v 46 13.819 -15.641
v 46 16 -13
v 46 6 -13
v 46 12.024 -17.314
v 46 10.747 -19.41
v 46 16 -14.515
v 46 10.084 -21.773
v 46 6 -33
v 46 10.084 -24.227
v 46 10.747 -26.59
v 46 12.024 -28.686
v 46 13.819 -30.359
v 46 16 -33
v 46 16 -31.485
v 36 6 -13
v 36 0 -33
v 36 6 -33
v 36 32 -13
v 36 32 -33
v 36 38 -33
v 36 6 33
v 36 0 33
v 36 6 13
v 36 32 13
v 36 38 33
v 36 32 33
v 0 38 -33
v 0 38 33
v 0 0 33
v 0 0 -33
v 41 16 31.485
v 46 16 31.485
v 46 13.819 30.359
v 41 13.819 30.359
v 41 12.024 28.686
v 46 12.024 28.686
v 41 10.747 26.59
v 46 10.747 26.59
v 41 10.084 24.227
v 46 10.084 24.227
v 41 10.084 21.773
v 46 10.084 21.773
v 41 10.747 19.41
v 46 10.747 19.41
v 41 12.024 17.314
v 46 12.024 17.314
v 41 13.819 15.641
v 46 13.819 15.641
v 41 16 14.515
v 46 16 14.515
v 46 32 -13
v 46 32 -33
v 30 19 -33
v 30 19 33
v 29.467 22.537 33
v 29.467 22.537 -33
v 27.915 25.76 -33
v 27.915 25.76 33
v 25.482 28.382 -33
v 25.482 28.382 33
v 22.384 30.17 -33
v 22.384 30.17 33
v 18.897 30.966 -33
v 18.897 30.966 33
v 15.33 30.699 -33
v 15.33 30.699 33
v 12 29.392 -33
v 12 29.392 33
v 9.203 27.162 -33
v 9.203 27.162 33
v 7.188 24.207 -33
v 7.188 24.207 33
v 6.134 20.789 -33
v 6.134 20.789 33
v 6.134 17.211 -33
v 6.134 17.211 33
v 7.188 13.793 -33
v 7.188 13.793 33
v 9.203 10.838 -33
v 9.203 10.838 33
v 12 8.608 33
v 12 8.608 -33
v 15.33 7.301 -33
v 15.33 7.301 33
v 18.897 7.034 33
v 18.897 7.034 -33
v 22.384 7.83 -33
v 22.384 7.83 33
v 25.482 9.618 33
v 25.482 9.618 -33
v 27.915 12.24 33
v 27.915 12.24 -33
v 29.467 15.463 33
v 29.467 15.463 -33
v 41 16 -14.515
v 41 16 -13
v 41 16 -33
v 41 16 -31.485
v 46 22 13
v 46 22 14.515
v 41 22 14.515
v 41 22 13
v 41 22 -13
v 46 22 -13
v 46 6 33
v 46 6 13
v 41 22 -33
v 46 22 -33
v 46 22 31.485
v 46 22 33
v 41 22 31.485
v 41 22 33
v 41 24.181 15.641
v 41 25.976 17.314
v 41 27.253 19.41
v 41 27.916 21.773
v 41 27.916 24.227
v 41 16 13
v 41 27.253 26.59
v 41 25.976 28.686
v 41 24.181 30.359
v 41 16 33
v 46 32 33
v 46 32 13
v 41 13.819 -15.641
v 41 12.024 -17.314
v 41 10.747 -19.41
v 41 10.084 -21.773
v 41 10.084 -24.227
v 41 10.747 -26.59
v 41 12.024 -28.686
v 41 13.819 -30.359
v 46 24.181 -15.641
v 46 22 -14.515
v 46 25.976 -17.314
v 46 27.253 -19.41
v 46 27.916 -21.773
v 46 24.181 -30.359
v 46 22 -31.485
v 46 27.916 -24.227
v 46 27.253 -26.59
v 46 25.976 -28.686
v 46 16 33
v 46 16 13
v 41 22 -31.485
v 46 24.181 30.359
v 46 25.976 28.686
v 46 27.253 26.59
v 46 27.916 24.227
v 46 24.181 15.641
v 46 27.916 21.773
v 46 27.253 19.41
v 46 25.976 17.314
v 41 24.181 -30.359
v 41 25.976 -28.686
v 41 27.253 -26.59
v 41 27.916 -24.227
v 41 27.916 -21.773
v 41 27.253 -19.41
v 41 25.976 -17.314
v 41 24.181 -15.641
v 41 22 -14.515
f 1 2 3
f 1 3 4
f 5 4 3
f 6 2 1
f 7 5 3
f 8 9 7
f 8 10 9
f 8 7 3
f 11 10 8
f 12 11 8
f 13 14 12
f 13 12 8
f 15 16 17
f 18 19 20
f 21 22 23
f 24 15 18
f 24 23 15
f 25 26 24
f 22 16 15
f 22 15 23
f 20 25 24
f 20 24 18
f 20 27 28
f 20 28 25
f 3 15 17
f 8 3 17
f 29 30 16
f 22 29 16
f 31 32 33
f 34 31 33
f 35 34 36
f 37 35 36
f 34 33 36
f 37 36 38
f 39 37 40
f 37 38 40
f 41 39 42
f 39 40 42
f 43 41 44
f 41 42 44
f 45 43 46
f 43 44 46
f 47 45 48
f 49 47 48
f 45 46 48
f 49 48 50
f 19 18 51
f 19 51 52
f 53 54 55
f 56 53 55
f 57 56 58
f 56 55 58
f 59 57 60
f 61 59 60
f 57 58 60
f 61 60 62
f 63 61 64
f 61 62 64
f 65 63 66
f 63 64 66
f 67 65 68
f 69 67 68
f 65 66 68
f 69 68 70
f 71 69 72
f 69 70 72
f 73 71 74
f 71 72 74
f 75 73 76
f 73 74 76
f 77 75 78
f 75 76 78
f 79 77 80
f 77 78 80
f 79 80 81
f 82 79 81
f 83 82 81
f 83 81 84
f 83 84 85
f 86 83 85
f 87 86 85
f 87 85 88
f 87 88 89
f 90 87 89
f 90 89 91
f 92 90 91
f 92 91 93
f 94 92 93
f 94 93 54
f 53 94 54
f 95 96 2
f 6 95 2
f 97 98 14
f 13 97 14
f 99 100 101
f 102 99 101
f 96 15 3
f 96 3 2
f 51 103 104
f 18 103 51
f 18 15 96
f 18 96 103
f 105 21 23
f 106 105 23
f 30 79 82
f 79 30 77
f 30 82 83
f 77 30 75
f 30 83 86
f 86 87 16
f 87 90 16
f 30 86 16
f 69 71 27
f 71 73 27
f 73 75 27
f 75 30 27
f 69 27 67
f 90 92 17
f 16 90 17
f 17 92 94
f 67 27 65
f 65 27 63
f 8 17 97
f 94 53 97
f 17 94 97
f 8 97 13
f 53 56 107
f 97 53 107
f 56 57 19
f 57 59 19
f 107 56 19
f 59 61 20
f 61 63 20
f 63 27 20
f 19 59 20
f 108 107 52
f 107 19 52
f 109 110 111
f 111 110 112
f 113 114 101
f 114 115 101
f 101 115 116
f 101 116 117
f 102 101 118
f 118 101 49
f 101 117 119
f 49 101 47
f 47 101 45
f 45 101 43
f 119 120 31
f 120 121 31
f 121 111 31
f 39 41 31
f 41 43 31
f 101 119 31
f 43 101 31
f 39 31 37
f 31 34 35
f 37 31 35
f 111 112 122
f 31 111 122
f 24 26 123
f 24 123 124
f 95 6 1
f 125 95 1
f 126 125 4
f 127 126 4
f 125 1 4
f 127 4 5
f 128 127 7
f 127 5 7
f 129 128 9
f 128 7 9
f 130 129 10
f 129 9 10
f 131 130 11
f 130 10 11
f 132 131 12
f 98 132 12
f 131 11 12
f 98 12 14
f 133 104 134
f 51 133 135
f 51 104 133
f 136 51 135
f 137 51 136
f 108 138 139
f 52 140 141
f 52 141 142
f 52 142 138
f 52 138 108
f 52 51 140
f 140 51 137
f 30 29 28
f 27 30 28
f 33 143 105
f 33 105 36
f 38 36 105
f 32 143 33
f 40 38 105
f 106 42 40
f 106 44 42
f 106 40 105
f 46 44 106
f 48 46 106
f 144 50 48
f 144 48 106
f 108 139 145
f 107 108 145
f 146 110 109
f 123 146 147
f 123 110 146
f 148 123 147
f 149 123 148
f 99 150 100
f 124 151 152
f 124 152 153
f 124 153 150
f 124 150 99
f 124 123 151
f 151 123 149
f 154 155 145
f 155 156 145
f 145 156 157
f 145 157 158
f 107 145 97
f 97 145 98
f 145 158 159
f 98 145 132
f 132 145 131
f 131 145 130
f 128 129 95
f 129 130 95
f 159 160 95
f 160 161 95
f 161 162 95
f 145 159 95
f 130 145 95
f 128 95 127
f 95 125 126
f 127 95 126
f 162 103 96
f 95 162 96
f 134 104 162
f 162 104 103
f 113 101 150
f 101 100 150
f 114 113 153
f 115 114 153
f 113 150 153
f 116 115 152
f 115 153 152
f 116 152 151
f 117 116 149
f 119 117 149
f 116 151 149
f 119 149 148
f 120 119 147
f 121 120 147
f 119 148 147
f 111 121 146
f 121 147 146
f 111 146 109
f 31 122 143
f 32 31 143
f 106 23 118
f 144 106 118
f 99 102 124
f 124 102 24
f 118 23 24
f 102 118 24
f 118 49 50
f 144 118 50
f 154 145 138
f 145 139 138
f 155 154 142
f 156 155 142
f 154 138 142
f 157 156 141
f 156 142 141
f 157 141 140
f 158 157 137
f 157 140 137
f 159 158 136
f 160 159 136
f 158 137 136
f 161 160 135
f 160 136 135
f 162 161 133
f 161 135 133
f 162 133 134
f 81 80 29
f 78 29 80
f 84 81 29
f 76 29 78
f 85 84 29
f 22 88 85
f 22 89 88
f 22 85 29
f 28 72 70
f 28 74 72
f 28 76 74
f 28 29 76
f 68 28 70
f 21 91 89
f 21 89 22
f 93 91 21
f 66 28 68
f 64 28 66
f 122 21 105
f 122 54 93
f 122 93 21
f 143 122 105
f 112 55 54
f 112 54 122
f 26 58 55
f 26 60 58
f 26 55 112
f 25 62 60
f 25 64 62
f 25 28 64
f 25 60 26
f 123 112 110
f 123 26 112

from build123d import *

# Parameters (mm, degrees)
SKETCH1_W           = 36
SKETCH1_H           = 38
BOSS_EXTRUDE1_DEPTH = 33
SKETCH2_R           = 12
CUT_EXTRUDE1_DEPTH  = 85.237758755
SKETCH3_W           = 20
SKETCH3_H           = 26
BOSS_EXTRUDE2_DEPTH = 10
SKETCH7_R           = 9
CUT_EXTRUDE4_DEPTH  = 5
CUT_EXTRUDE5_DEPTH  = 89.971905678


with BuildPart() as part:
    # Sketch1 → Boss-Extrude1 (new, symmetric)
    with BuildSketch(Plane.XY):
        with Locations((18, 19)):
            Rectangle(SKETCH1_W, SKETCH1_H)
    extrude(amount=BOSS_EXTRUDE1_DEPTH, both=True)

    # Sketch2 → Cut-Extrude1 (cut, through all)
    with BuildSketch(Plane.XY.offset(33)):
        with Locations((18, 19)):
            Circle(SKETCH2_R)
    extrude(amount=-CUT_EXTRUDE1_DEPTH, mode=Mode.SUBTRACT)

    # Sketch3 → Boss-Extrude2 (add)
    with BuildSketch(Plane(origin=(36, 0, 0), x_dir=(0, 0, -1), z_dir=(1, 0, 0))):
        with Locations((-23, 19)):
            Rectangle(SKETCH3_W, SKETCH3_H)
        with Locations((23, 19)):
            Rectangle(SKETCH3_W, SKETCH3_H)
    extrude(amount=BOSS_EXTRUDE2_DEPTH)

    # Sketch7 → Cut-Extrude4 (cut)
    with BuildSketch(Plane(origin=(46, 0, 0), x_dir=(0, 0, -1), z_dir=(1, 0, 0))):
        with Locations(Location((-23, 19, 0), (0, 0, 90))):
            Circle(SKETCH7_R)
        with Locations(Location((23, 19, 0), (0, 0, 90))):
            Circle(SKETCH7_R)
    extrude(amount=-CUT_EXTRUDE4_DEPTH, mode=Mode.SUBTRACT)

    # Sketch8 → Cut-Extrude5 (cut, through all)
    with BuildSketch(Plane.XY.offset(33)):
        Polygon((46, 19), (46, 22), (41, 22), (41, 16), (46, 16), align=None)
    extrude(amount=-CUT_EXTRUDE5_DEPTH, mode=Mode.SUBTRACT)


solid = part.part
